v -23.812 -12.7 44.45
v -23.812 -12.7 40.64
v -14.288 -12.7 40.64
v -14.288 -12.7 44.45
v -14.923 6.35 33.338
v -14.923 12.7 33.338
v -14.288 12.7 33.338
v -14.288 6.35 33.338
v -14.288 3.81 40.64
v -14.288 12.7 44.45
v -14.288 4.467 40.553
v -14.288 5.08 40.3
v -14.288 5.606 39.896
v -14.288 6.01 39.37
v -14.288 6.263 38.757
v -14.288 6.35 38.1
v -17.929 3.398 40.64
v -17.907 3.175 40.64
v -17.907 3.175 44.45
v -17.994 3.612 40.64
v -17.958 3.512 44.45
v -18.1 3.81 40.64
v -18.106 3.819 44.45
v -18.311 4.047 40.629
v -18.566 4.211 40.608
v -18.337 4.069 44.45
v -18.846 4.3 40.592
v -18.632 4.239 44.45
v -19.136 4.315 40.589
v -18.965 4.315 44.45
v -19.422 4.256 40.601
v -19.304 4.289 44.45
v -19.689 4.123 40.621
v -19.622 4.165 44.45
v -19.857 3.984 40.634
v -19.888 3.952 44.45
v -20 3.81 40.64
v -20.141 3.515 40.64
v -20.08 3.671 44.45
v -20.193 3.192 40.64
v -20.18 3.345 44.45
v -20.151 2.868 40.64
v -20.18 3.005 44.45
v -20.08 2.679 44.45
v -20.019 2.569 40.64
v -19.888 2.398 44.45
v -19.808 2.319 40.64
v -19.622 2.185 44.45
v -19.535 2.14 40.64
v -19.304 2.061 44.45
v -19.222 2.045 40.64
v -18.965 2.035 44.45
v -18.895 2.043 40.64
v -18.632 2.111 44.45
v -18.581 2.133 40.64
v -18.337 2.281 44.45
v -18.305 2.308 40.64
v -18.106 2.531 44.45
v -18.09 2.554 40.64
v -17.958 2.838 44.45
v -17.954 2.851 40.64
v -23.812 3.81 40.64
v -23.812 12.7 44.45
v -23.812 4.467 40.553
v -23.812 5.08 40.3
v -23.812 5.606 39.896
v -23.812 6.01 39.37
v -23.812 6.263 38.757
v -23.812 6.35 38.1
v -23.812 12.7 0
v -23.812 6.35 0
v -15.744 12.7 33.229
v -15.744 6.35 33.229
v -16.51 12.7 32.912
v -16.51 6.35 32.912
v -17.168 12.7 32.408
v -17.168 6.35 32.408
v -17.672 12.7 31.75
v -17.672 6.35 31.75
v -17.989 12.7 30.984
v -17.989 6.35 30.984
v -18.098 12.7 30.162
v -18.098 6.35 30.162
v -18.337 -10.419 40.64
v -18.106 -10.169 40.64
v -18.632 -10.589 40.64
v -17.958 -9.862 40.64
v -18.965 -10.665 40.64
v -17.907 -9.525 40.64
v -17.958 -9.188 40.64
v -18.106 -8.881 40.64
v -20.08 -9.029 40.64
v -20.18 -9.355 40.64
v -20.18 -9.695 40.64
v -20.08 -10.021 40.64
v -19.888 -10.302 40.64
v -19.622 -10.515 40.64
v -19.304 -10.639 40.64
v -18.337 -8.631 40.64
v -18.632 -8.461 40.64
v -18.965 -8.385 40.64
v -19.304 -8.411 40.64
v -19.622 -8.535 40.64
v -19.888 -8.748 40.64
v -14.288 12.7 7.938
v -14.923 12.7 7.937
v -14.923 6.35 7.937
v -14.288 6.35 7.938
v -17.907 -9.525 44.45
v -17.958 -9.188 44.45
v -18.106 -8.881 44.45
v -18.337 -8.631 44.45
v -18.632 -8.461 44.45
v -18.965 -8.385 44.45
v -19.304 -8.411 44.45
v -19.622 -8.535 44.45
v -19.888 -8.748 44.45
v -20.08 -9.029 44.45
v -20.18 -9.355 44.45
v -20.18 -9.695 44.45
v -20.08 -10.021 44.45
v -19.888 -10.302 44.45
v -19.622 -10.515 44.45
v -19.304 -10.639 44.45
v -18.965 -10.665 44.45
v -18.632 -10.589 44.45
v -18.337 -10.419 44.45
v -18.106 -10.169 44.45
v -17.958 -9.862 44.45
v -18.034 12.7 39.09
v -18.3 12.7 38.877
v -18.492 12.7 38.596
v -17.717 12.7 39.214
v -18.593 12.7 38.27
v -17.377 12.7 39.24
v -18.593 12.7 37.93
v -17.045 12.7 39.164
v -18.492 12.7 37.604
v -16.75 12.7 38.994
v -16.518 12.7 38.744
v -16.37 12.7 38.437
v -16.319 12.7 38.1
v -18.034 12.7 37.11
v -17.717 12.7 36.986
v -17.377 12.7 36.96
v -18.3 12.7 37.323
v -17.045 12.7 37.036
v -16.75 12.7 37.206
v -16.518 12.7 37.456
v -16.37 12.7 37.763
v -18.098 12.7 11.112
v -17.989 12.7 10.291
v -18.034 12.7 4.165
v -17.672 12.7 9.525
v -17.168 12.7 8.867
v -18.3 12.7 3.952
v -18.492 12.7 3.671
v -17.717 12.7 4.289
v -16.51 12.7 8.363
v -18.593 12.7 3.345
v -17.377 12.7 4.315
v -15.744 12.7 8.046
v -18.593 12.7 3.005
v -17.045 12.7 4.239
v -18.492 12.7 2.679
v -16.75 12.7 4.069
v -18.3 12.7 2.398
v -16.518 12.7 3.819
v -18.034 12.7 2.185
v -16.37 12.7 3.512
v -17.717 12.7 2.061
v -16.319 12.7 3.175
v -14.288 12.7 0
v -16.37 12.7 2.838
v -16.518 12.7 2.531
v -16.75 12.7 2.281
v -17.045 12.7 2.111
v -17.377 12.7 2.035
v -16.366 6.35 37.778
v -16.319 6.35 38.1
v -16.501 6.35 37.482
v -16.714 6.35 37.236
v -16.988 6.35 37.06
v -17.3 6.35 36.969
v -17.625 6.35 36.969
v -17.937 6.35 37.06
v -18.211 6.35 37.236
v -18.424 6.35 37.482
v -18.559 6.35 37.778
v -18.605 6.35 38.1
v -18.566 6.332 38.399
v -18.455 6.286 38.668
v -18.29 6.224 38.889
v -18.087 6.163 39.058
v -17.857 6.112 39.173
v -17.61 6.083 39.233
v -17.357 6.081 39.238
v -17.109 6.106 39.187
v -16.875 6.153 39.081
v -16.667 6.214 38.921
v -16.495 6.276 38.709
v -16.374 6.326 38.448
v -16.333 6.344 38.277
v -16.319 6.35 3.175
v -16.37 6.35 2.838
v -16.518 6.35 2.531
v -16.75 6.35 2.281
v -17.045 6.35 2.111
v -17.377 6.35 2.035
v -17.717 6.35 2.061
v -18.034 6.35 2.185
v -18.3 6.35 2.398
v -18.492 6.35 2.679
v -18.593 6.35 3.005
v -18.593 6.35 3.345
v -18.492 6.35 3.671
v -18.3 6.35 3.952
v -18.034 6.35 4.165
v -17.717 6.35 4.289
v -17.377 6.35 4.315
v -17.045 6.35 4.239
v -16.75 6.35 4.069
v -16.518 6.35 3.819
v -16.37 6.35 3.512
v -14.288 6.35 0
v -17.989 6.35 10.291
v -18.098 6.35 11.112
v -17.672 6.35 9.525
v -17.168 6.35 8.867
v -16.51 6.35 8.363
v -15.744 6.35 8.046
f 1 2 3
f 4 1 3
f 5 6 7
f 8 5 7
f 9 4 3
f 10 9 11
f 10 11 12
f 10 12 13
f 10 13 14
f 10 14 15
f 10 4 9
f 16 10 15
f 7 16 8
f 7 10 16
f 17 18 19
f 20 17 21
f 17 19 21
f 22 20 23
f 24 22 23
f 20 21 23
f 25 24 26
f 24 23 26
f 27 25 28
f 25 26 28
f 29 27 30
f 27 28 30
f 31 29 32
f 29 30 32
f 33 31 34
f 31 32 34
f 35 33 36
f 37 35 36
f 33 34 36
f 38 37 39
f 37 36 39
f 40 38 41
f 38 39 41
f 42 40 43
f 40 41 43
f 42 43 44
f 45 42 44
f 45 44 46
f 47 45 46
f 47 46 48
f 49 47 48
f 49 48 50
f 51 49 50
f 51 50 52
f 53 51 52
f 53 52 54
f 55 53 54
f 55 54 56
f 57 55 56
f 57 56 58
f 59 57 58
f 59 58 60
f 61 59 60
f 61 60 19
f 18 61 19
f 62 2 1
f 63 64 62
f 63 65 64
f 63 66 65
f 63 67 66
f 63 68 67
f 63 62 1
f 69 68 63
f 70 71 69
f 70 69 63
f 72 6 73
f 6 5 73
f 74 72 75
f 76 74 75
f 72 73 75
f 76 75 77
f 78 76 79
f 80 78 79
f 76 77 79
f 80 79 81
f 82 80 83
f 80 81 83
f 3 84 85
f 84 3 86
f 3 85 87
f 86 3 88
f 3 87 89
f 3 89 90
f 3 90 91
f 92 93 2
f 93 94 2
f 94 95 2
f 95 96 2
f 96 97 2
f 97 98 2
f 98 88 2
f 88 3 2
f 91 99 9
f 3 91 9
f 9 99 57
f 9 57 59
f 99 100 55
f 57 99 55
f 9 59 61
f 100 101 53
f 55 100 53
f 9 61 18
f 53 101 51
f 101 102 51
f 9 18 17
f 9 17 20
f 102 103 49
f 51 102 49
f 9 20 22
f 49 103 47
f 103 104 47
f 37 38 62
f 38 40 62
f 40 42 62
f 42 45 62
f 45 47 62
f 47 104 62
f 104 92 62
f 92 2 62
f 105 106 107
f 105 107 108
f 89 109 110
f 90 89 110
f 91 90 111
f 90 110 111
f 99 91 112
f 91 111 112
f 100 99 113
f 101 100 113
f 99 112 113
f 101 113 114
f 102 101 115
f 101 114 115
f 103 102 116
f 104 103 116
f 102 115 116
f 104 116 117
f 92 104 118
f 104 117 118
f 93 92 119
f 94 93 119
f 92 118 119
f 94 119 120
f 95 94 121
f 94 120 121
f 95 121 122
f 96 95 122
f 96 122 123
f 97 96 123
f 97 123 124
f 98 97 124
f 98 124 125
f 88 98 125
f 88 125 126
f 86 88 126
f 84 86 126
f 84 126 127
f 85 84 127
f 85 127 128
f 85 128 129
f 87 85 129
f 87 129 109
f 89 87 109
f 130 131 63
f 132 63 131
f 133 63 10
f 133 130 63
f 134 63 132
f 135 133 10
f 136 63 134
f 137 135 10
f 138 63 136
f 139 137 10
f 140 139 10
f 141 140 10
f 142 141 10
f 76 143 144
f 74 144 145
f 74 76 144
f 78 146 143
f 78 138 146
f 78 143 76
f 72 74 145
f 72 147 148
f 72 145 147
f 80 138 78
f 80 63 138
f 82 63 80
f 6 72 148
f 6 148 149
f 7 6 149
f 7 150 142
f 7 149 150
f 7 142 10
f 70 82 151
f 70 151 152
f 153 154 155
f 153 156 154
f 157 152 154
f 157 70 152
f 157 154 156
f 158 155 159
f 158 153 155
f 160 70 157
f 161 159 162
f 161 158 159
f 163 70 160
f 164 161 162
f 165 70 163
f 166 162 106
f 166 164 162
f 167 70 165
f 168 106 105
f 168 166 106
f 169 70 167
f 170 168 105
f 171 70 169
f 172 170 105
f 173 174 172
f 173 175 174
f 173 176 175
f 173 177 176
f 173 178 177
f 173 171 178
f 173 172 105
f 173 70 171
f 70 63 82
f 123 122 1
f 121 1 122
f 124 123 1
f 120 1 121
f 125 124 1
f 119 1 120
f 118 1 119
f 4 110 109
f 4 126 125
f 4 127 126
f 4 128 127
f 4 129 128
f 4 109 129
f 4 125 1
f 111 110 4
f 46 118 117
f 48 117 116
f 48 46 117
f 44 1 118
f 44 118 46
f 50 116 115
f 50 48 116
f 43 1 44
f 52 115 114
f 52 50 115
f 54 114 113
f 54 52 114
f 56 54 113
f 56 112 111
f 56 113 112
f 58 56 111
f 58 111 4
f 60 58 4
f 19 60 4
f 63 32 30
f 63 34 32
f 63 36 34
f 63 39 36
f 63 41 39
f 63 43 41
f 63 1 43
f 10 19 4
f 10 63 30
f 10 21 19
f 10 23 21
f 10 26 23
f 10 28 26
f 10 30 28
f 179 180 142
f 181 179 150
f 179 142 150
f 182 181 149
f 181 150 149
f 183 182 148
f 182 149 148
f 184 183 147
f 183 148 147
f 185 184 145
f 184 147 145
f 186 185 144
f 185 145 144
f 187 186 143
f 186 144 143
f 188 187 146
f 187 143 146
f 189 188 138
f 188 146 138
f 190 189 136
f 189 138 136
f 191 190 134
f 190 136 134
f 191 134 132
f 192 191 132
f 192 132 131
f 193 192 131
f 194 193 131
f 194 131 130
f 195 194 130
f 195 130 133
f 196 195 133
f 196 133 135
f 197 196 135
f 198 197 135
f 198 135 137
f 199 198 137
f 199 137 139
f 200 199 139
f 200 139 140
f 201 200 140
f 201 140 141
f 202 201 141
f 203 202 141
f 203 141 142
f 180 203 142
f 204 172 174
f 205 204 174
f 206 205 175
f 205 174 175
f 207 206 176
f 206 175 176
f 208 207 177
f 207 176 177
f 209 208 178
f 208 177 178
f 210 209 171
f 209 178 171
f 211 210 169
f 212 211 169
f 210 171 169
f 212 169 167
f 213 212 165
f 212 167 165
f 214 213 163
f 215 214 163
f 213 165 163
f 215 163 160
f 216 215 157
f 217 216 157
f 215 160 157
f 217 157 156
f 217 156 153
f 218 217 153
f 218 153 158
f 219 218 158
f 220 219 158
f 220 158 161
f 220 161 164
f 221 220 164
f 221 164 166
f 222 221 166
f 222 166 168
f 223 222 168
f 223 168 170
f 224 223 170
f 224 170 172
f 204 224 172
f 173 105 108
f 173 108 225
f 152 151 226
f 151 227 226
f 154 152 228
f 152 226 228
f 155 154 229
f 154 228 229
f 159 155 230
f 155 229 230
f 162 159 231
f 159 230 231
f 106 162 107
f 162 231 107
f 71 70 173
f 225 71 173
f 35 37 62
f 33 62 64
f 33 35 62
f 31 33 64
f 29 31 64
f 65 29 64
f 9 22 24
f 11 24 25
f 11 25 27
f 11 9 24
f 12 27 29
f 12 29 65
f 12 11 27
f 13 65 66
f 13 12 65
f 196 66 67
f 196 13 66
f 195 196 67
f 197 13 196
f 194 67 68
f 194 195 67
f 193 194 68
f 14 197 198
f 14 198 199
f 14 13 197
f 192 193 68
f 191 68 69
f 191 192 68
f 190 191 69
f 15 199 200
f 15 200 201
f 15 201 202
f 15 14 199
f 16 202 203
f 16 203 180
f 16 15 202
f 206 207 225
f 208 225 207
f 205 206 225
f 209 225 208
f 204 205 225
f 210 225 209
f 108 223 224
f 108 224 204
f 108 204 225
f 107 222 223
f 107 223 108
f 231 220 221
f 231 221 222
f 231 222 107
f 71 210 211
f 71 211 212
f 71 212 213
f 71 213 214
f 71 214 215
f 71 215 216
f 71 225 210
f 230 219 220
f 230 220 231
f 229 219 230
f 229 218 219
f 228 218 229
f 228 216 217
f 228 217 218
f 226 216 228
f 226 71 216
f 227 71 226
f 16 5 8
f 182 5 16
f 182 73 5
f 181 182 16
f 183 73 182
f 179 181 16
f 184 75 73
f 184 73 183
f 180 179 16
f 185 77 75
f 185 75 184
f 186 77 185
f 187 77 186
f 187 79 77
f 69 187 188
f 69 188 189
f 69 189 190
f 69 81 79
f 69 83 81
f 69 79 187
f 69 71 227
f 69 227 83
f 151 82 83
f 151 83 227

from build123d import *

# Parameters (mm, degrees)
SKETCH2_W           = 47.625
SKETCH2_H           = 25.4
BOSS_EXTRUDE1_DEPTH = 44.45
SKETCH3_W           = 28.575
SKETCH3_H           = 44.45
CUT_EXTRUDE1_DEPTH  = 26.4
SKETCH4_W           = 40.64
SKETCH4_H           = 19.05
CUT_EXTRUDE2_DEPTH  = 48.625
FILLET1_R           = 2.54
FILLET2_R           = 2.54
SKETCH5_R           = 1.143
CUT_EXTRUDE3_DEPTH  = 45.45
SKETCH6_R           = 1.143
CUT_EXTRUDE4_DEPTH  = 45.45
SKETCH7_R           = 1.143
CUT_EXTRUDE5_DEPTH  = 10.16
SKETCH8_W           = 36.195
SKETCH8_H           = 25.4
CUT_EXTRUDE6_DEPTH  = 26.4
FILLET3_R           = 3.175
FILLET4_R           = 3.175
SKETCH9_W           = 87.912640597
SKETCH9_H           = 53.774742358
CUT_EXTRUDE7_DEPTH  = 35.56


with BuildPart() as part:
    # Sketch2 → Boss-Extrude1 (new body)
    with BuildSketch(Plane.XY):
        Rectangle(SKETCH2_W, SKETCH2_H)
    extrude(amount=BOSS_EXTRUDE1_DEPTH)

    # Sketch3 → Cut-Extrude1 (cut, through all)
    with BuildSketch(Plane(origin=(0, 12.7, 0), x_dir=(1, 0, 0), z_dir=(0, 1, 0))):
        with Locations((0, -22.225)):
            Rectangle(SKETCH3_W, SKETCH3_H)
    extrude(amount=-CUT_EXTRUDE1_DEPTH, mode=Mode.SUBTRACT)

    # Sketch4 → Cut-Extrude2 (cut, through all)
    with BuildSketch(Plane.ZY.offset(23.8125)):
        with Locations((20.32, -3.175)):
            Rectangle(SKETCH4_W, SKETCH4_H)
    extrude(amount=-CUT_EXTRUDE2_DEPTH, mode=Mode.SUBTRACT)

    # Fillet1
    fillet1_edges = [part.edges().sort_by_distance(p)[0] for p in [
        (19.05, 6.35, 40.64),
    ]]
    fillet(fillet1_edges, radius=FILLET1_R)

    # Fillet2
    fillet2_edges = [part.edges().sort_by_distance(p)[0] for p in [
        (-19.05, 6.35, 40.64),
    ]]
    fillet(fillet2_edges, radius=FILLET2_R)

    # Sketch5 → Cut-Extrude3 (cut, through all)
    with BuildSketch(Plane.XY.offset(44.45)):
        with Locations((-19.05, -9.525)):
            Circle(SKETCH5_R)
        with Locations((-19.05, 3.175)):
            Circle(SKETCH5_R)
    extrude(amount=-CUT_EXTRUDE3_DEPTH, mode=Mode.SUBTRACT)

    # Sketch6 → Cut-Extrude4 (cut, through all)
    with BuildSketch(Plane.XY.offset(44.45)):
        with Locations((19.05, -9.525)):
            Circle(SKETCH6_R)
        with Locations((19.05, 3.175)):
            Circle(SKETCH6_R)
    extrude(amount=-CUT_EXTRUDE4_DEPTH, mode=Mode.SUBTRACT)

    # Sketch7 → Cut-Extrude5 (cut)
    with BuildSketch(Plane(origin=(0, 12.7, 0), x_dir=(1, 0, 0), z_dir=(0, 1, 0))):
        with Locations((-17.4625, -38.1)):
            Circle(SKETCH7_R)
        with Locations((17.4625, -38.1)):
            Circle(SKETCH7_R)
        with Locations((-17.4625, -3.175)):
            Circle(SKETCH7_R)
        with Locations((17.4625, -3.175)):
            Circle(SKETCH7_R)
    extrude(amount=-CUT_EXTRUDE5_DEPTH, mode=Mode.SUBTRACT)

    # Sketch8 → Cut-Extrude6 (cut, through all)
    with BuildSketch(Plane(origin=(0, 12.7, 0), x_dir=(1, 0, 0), z_dir=(0, 1, 0))):
        with Locations((0, -20.6375)):
            Rectangle(SKETCH8_W, SKETCH8_H)
    extrude(amount=-CUT_EXTRUDE6_DEPTH, mode=Mode.SUBTRACT)

    # Fillet3
    fillet3_edges = [part.edges().sort_by_distance(p)[0] for p in [
        (-18.0975, 9.525, 33.3375),
        (-18.0975, 9.525, 7.9375),
    ]]
    fillet(fillet3_edges, radius=FILLET3_R)

    # Fillet4
    fillet4_edges = [part.edges().sort_by_distance(p)[0] for p in [
        (18.0975, 9.525, 7.9375),
        (18.0975, 9.525, 33.3375),
    ]]
    fillet(fillet4_edges, radius=FILLET4_R)

    # Sketch9 → Cut-Extrude7 (cut)
    with BuildSketch(Plane(origin=(0, 0, 0), x_dir=(0, 0, -1), z_dir=(1, 0, 0))):
        with Locations((-24.289386177, -0.100701765)):
            Rectangle(SKETCH9_W, SKETCH9_H)
    extrude(amount=CUT_EXTRUDE7_DEPTH, mode=Mode.SUBTRACT)


solid = part.part
